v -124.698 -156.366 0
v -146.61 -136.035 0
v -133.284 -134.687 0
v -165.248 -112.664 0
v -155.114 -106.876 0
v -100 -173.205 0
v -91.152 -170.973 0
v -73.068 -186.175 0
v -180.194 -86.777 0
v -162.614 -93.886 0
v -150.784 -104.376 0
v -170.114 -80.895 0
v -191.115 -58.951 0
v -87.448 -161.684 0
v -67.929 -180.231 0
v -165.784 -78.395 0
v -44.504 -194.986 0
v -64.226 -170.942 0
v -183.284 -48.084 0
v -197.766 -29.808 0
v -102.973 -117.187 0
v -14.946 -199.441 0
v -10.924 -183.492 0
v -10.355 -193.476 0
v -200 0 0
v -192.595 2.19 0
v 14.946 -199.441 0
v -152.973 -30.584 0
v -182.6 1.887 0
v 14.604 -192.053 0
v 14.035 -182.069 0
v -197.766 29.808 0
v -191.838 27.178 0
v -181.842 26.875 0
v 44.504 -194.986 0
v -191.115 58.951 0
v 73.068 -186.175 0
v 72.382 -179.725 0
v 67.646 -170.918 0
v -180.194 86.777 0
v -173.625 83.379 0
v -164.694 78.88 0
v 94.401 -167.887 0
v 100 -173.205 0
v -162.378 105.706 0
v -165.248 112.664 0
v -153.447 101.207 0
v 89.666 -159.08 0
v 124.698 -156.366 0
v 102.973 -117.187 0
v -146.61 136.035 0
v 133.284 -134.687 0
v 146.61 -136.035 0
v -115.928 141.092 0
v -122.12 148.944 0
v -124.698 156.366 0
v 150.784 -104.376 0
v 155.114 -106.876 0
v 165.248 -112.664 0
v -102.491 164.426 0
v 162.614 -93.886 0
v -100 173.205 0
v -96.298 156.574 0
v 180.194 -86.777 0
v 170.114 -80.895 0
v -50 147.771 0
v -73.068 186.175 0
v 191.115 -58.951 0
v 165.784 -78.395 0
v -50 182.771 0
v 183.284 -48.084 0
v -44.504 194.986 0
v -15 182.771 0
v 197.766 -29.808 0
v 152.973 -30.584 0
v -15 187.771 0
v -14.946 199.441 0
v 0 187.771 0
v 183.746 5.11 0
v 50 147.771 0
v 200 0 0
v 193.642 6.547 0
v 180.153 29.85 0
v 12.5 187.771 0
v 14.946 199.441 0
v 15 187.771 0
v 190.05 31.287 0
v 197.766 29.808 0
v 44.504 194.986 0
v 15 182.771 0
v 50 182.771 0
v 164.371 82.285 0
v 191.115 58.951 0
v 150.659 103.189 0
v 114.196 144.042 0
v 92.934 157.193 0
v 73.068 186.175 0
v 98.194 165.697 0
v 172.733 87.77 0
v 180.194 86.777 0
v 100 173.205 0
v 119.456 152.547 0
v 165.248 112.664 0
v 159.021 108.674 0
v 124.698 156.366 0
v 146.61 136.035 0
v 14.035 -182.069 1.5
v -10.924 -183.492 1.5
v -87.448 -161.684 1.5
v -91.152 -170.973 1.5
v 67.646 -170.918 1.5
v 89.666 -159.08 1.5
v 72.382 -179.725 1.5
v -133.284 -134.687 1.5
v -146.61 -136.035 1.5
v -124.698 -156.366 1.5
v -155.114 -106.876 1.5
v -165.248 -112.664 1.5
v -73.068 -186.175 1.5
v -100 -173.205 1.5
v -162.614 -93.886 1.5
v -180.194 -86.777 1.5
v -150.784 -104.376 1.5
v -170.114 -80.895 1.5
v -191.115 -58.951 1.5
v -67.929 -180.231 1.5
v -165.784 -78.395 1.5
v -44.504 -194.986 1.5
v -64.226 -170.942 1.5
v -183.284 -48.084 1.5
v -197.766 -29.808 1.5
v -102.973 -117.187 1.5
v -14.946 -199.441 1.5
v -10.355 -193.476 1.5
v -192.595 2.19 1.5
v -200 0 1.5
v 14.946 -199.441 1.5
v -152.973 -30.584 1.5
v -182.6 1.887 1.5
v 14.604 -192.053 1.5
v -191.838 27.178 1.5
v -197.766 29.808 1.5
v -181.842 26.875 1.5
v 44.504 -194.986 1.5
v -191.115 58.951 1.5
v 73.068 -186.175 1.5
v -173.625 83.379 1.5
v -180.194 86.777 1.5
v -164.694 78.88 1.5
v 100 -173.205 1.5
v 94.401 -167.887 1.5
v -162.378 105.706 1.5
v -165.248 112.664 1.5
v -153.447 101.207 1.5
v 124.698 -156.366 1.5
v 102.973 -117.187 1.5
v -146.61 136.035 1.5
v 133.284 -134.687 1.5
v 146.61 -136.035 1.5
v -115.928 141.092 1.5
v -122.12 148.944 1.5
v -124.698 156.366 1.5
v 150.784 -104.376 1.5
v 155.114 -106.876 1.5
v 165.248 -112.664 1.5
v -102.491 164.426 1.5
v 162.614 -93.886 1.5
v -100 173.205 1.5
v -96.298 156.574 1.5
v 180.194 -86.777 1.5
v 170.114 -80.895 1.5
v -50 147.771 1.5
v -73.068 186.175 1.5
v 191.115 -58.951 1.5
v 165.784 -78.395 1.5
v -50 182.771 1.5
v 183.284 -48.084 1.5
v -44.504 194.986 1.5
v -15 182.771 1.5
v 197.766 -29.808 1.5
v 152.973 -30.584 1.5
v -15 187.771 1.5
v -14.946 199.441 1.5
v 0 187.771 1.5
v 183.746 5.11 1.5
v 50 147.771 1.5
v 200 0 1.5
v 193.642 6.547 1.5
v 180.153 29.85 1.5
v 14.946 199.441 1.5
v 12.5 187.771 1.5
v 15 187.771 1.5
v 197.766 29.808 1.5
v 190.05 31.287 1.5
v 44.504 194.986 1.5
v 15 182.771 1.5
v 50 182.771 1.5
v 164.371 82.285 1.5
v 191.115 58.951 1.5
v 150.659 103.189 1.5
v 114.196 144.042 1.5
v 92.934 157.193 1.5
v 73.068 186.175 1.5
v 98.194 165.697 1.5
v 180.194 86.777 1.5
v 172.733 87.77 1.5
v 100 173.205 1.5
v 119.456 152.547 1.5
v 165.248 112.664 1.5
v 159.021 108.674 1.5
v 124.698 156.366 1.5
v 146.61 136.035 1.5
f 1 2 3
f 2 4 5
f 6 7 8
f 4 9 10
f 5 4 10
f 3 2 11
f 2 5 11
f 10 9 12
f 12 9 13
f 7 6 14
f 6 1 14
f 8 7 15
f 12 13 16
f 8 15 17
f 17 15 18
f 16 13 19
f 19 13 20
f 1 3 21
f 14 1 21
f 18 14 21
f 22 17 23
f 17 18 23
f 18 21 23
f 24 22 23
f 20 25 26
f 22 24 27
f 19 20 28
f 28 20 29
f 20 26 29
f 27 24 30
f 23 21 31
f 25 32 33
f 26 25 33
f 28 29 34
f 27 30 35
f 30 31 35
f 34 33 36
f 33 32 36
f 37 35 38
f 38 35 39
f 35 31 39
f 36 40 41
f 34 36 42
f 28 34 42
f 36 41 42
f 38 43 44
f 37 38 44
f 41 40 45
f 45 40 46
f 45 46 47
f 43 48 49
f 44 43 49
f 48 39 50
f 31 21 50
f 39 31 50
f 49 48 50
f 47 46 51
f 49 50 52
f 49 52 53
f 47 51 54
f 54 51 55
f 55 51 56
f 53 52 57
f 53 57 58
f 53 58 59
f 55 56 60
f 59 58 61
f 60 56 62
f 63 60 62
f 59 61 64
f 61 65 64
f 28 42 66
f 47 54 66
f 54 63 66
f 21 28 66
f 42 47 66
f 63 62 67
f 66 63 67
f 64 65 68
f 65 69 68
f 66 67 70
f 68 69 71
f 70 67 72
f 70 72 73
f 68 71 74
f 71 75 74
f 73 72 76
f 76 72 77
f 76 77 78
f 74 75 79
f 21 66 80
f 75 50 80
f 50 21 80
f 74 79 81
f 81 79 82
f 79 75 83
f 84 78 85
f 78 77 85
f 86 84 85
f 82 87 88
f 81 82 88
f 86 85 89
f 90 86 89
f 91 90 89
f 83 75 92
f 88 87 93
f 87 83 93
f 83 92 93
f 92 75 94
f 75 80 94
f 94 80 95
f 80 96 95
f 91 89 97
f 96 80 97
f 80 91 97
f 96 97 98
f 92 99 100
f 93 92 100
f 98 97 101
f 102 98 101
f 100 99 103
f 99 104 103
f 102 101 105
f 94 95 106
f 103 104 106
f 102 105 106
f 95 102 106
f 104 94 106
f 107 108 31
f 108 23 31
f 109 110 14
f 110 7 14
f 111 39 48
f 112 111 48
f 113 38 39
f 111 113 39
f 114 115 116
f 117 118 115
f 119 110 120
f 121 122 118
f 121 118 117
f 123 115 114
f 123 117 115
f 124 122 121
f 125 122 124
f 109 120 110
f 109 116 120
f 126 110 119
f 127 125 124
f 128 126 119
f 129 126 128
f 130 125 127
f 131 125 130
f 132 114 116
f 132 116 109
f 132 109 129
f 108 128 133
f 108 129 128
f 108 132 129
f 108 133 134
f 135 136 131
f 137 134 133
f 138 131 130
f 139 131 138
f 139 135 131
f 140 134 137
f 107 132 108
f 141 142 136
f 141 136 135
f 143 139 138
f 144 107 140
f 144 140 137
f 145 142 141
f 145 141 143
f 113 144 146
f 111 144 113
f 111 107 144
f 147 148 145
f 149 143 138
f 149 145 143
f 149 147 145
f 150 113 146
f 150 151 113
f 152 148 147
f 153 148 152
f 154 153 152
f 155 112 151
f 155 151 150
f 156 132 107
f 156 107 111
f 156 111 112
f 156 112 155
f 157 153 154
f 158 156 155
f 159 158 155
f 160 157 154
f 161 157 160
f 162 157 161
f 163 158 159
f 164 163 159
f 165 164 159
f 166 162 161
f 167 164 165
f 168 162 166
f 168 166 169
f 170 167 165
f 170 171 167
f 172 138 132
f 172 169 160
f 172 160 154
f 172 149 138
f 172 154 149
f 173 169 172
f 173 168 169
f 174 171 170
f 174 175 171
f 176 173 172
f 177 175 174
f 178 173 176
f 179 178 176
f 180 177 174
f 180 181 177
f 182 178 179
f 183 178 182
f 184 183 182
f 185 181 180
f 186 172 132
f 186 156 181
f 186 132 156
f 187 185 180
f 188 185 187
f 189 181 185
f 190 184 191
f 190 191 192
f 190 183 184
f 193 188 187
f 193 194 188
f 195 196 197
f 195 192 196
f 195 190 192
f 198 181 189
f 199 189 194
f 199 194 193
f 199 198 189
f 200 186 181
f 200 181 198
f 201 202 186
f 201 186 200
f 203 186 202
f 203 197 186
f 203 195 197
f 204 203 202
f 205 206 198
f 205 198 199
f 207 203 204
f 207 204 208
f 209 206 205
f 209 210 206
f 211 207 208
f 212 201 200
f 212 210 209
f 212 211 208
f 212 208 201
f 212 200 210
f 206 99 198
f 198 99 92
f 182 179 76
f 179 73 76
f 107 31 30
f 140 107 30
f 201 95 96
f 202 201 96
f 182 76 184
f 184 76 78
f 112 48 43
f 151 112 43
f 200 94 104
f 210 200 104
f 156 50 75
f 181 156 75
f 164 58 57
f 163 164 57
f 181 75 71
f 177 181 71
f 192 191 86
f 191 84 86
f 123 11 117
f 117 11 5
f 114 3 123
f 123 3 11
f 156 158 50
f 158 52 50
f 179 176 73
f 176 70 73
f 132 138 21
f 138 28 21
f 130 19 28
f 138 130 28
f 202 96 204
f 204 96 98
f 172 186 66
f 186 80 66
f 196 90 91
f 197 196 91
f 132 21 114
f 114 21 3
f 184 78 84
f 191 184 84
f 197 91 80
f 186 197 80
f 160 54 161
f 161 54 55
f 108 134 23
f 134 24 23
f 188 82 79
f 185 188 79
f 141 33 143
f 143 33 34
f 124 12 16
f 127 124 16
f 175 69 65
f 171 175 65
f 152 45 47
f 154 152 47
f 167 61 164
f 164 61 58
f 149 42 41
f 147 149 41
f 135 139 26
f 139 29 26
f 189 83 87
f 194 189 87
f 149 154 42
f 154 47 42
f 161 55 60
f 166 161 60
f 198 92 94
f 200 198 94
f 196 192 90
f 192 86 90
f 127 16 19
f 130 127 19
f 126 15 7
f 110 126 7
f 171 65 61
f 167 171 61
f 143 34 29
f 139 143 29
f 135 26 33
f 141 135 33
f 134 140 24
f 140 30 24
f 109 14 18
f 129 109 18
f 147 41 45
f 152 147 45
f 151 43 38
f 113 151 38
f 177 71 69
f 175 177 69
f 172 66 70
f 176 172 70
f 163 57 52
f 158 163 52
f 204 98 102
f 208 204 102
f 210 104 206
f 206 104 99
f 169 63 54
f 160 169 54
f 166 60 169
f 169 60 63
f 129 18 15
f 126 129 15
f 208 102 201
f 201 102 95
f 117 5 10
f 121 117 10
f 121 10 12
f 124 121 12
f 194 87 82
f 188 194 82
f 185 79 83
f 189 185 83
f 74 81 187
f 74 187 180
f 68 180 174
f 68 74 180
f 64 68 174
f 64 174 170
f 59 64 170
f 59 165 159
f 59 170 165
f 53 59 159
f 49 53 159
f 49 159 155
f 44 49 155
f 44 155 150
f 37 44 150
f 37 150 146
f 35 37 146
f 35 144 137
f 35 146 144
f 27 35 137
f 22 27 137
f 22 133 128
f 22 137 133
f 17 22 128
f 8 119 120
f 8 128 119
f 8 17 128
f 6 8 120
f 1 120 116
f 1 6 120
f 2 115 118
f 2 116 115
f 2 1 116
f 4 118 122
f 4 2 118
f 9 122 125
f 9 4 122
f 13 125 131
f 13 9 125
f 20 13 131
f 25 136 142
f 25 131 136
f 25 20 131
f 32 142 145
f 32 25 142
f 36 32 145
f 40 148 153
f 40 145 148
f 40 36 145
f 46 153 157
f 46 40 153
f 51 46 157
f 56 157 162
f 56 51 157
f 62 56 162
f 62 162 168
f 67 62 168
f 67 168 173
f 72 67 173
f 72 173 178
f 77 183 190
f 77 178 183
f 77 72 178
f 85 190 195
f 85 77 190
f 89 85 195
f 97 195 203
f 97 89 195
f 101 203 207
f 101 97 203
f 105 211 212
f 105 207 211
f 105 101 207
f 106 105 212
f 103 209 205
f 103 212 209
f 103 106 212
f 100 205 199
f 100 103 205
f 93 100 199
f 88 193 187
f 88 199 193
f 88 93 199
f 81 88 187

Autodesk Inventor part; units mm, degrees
ref_plane "YZ Plane" through (0, 0, 0) normal (1, 0, 0) x (0, 1, 0)
ref_plane "XZ Plane" through (0, 0, 0) normal (0, 1, 0) x (-1, 0, 0)
ref_plane "XY Plane" through (0, 0, 0) normal (0, 0, 1) x (1, 0, 0)
sketch "Sketch1" plane through (0, 0, 0) normal (0, 0, 1) x (1, 0, 0)
  circle A0 centre (0, 0) radius 200
  line L0 (0, 187.7709) -> (15, 187.7709)
  line L1 (15, 187.7709) -> (15, 182.7709)
  line L2 (15, 182.7709) -> (50, 182.7709)
  line L3 (50, 182.7709) -> (50, 147.7709)
  line L4 (50, 147.7709) -> (-50, 147.7709)
  line L5 (-50, 147.7709) -> (-50, 182.7709)
  line L6 (-50, 182.7709) -> (-15, 182.7709)
  line L7 (-15, 182.7709) -> (-15, 187.7709)
  line L8 (-15, 187.7709) -> (0, 187.7709)
  line L9 (-162.6144, -93.8855) -> (-170.1144, -80.8951)
  line L10 (-170.1144, -80.8951) -> (-165.7843, -78.3951)
  line L11 (-165.7843, -78.3951) -> (-183.2843, -48.0842)
  line L12 (-183.2843, -48.0842) -> (-152.9734, -30.5842)
  line L13 (-152.9734, -30.5842) -> (-102.9734, -117.1867)
  line L14 (-102.9734, -117.1867) -> (-133.2843, -134.6867)
  line L15 (-133.2843, -134.6867) -> (-150.7843, -104.3758)
  line L16 (-150.7843, -104.3758) -> (-155.1144, -106.8758)
  line L17 (-155.1144, -106.8758) -> (-162.6144, -93.8855)
  line L18 (162.6144, -93.8855) -> (155.1144, -106.8758)
  line L19 (155.1144, -106.8758) -> (150.7843, -104.3758)
  line L20 (150.7843, -104.3758) -> (133.2843, -134.6867)
  line L21 (133.2843, -134.6867) -> (102.9734, -117.1867)
  line L22 (102.9734, -117.1867) -> (152.9734, -30.5842)
  line L23 (152.9734, -30.5842) -> (183.2843, -48.0842)
  line L24 (183.2843, -48.0842) -> (165.7843, -78.3951)
  line L25 (165.7843, -78.3951) -> (170.1144, -80.8951)
  line L26 (170.1144, -80.8951) -> (162.6144, -93.8855)
  line L27 (12.5, 183.7364) -> (12.5, 193.7364)
  line L28 (-173.6251, 83.379) -> (-162.3777, 105.706)
  line L29 (-162.3777, 105.706) -> (-153.4469, 101.2071)
  line L30 (-153.4469, 101.2071) -> (-164.6943, 78.88)
  line L31 (-164.6943, 78.88) -> (-173.6251, 83.379)
  line L32 (-181.8421, 26.8753) -> (-182.5998, 1.8868)
  line L33 (-192.5952, 2.1899) -> (-191.8375, 27.1784)
  line L34 (-182.5998, 1.8868) -> (-192.5952, 2.1899)
  line L35 (-191.8375, 27.1784) -> (-181.8421, 26.8753)
  line L36 (-115.9276, 141.0924) -> (-122.1203, 148.9442)
  line L37 (-96.2982, 156.5742) -> (-115.9276, 141.0924)
  line L38 (-102.4909, 164.426) -> (-96.2982, 156.5742)
  line L39 (-122.1203, 148.9442) -> (-102.4909, 164.426)
  line L40 (72.3815, -179.7253) -> (67.6463, -170.9175)
  line L41 (67.6463, -170.9175) -> (89.6659, -159.0795)
  line L42 (94.4011, -167.8873) -> (72.3815, -179.7253)
  line L43 (89.6659, -159.0795) -> (94.4011, -167.8873)
  line L44 (14.035, -182.0694) -> (14.6042, -192.0532)
  line L45 (-10.9244, -183.4924) -> (14.035, -182.0694)
  line L46 (-10.3552, -193.4762) -> (-10.9244, -183.4924)
  line L47 (14.6042, -192.0532) -> (-10.3552, -193.4762)
  line L48 (-64.2258, -170.9424) -> (-67.9293, -180.2313)
  line L49 (-87.4482, -161.6838) -> (-64.2258, -170.9424)
  line L50 (-67.9293, -180.2313) -> (-91.1516, -170.9727)
  line L51 (-91.1516, -170.9727) -> (-87.4482, -161.6838)
  line L52 (119.4559, 152.5469) -> (114.1957, 144.0422)
  line L53 (114.1957, 144.0422) -> (92.9339, 157.1927)
  line L54 (98.1941, 165.6974) -> (119.4559, 152.5469)
  line L55 (92.9339, 157.1927) -> (98.1941, 165.6974)
  line L56 (150.6592, 103.1894) -> (159.0209, 108.6742)
  line L57 (164.3713, 82.2854) -> (150.6592, 103.1894)
  line L58 (172.7329, 87.7702) -> (164.3713, 82.2854)
  line L59 (159.0209, 108.6742) -> (172.7329, 87.7702)
  line L60 (180.1534, 29.85) -> (190.0496, 31.2872)
  line L61 (183.7463, 5.1095) -> (180.1534, 29.85)
  line L62 (190.0496, 31.2872) -> (193.6425, 6.5467)
  line L63 (193.6425, 6.5467) -> (183.7463, 5.1095)
  point P0 (-163.536, 92.293)
  point P1 (-187.2187, 14.5326)
  point P2 (-109.2092, 152.7592)
  point P3 (81.0237, -169.4024)
  point P4 (1.8399, -187.7728)
  point P5 (-77.6887, -170.9575)
  point P6 (106.1949, 154.8698)
  point P7 (161.6961, 95.4798)
  point P8 (186.8979, 18.1984)
  dimension "d12" = 360
  dimension "d28" = 25
  dimension "d32" = 25
  dimension "d36" = 360
extrude "Extrusion1" add sketch "Sketch1" along normal blind 1.5
